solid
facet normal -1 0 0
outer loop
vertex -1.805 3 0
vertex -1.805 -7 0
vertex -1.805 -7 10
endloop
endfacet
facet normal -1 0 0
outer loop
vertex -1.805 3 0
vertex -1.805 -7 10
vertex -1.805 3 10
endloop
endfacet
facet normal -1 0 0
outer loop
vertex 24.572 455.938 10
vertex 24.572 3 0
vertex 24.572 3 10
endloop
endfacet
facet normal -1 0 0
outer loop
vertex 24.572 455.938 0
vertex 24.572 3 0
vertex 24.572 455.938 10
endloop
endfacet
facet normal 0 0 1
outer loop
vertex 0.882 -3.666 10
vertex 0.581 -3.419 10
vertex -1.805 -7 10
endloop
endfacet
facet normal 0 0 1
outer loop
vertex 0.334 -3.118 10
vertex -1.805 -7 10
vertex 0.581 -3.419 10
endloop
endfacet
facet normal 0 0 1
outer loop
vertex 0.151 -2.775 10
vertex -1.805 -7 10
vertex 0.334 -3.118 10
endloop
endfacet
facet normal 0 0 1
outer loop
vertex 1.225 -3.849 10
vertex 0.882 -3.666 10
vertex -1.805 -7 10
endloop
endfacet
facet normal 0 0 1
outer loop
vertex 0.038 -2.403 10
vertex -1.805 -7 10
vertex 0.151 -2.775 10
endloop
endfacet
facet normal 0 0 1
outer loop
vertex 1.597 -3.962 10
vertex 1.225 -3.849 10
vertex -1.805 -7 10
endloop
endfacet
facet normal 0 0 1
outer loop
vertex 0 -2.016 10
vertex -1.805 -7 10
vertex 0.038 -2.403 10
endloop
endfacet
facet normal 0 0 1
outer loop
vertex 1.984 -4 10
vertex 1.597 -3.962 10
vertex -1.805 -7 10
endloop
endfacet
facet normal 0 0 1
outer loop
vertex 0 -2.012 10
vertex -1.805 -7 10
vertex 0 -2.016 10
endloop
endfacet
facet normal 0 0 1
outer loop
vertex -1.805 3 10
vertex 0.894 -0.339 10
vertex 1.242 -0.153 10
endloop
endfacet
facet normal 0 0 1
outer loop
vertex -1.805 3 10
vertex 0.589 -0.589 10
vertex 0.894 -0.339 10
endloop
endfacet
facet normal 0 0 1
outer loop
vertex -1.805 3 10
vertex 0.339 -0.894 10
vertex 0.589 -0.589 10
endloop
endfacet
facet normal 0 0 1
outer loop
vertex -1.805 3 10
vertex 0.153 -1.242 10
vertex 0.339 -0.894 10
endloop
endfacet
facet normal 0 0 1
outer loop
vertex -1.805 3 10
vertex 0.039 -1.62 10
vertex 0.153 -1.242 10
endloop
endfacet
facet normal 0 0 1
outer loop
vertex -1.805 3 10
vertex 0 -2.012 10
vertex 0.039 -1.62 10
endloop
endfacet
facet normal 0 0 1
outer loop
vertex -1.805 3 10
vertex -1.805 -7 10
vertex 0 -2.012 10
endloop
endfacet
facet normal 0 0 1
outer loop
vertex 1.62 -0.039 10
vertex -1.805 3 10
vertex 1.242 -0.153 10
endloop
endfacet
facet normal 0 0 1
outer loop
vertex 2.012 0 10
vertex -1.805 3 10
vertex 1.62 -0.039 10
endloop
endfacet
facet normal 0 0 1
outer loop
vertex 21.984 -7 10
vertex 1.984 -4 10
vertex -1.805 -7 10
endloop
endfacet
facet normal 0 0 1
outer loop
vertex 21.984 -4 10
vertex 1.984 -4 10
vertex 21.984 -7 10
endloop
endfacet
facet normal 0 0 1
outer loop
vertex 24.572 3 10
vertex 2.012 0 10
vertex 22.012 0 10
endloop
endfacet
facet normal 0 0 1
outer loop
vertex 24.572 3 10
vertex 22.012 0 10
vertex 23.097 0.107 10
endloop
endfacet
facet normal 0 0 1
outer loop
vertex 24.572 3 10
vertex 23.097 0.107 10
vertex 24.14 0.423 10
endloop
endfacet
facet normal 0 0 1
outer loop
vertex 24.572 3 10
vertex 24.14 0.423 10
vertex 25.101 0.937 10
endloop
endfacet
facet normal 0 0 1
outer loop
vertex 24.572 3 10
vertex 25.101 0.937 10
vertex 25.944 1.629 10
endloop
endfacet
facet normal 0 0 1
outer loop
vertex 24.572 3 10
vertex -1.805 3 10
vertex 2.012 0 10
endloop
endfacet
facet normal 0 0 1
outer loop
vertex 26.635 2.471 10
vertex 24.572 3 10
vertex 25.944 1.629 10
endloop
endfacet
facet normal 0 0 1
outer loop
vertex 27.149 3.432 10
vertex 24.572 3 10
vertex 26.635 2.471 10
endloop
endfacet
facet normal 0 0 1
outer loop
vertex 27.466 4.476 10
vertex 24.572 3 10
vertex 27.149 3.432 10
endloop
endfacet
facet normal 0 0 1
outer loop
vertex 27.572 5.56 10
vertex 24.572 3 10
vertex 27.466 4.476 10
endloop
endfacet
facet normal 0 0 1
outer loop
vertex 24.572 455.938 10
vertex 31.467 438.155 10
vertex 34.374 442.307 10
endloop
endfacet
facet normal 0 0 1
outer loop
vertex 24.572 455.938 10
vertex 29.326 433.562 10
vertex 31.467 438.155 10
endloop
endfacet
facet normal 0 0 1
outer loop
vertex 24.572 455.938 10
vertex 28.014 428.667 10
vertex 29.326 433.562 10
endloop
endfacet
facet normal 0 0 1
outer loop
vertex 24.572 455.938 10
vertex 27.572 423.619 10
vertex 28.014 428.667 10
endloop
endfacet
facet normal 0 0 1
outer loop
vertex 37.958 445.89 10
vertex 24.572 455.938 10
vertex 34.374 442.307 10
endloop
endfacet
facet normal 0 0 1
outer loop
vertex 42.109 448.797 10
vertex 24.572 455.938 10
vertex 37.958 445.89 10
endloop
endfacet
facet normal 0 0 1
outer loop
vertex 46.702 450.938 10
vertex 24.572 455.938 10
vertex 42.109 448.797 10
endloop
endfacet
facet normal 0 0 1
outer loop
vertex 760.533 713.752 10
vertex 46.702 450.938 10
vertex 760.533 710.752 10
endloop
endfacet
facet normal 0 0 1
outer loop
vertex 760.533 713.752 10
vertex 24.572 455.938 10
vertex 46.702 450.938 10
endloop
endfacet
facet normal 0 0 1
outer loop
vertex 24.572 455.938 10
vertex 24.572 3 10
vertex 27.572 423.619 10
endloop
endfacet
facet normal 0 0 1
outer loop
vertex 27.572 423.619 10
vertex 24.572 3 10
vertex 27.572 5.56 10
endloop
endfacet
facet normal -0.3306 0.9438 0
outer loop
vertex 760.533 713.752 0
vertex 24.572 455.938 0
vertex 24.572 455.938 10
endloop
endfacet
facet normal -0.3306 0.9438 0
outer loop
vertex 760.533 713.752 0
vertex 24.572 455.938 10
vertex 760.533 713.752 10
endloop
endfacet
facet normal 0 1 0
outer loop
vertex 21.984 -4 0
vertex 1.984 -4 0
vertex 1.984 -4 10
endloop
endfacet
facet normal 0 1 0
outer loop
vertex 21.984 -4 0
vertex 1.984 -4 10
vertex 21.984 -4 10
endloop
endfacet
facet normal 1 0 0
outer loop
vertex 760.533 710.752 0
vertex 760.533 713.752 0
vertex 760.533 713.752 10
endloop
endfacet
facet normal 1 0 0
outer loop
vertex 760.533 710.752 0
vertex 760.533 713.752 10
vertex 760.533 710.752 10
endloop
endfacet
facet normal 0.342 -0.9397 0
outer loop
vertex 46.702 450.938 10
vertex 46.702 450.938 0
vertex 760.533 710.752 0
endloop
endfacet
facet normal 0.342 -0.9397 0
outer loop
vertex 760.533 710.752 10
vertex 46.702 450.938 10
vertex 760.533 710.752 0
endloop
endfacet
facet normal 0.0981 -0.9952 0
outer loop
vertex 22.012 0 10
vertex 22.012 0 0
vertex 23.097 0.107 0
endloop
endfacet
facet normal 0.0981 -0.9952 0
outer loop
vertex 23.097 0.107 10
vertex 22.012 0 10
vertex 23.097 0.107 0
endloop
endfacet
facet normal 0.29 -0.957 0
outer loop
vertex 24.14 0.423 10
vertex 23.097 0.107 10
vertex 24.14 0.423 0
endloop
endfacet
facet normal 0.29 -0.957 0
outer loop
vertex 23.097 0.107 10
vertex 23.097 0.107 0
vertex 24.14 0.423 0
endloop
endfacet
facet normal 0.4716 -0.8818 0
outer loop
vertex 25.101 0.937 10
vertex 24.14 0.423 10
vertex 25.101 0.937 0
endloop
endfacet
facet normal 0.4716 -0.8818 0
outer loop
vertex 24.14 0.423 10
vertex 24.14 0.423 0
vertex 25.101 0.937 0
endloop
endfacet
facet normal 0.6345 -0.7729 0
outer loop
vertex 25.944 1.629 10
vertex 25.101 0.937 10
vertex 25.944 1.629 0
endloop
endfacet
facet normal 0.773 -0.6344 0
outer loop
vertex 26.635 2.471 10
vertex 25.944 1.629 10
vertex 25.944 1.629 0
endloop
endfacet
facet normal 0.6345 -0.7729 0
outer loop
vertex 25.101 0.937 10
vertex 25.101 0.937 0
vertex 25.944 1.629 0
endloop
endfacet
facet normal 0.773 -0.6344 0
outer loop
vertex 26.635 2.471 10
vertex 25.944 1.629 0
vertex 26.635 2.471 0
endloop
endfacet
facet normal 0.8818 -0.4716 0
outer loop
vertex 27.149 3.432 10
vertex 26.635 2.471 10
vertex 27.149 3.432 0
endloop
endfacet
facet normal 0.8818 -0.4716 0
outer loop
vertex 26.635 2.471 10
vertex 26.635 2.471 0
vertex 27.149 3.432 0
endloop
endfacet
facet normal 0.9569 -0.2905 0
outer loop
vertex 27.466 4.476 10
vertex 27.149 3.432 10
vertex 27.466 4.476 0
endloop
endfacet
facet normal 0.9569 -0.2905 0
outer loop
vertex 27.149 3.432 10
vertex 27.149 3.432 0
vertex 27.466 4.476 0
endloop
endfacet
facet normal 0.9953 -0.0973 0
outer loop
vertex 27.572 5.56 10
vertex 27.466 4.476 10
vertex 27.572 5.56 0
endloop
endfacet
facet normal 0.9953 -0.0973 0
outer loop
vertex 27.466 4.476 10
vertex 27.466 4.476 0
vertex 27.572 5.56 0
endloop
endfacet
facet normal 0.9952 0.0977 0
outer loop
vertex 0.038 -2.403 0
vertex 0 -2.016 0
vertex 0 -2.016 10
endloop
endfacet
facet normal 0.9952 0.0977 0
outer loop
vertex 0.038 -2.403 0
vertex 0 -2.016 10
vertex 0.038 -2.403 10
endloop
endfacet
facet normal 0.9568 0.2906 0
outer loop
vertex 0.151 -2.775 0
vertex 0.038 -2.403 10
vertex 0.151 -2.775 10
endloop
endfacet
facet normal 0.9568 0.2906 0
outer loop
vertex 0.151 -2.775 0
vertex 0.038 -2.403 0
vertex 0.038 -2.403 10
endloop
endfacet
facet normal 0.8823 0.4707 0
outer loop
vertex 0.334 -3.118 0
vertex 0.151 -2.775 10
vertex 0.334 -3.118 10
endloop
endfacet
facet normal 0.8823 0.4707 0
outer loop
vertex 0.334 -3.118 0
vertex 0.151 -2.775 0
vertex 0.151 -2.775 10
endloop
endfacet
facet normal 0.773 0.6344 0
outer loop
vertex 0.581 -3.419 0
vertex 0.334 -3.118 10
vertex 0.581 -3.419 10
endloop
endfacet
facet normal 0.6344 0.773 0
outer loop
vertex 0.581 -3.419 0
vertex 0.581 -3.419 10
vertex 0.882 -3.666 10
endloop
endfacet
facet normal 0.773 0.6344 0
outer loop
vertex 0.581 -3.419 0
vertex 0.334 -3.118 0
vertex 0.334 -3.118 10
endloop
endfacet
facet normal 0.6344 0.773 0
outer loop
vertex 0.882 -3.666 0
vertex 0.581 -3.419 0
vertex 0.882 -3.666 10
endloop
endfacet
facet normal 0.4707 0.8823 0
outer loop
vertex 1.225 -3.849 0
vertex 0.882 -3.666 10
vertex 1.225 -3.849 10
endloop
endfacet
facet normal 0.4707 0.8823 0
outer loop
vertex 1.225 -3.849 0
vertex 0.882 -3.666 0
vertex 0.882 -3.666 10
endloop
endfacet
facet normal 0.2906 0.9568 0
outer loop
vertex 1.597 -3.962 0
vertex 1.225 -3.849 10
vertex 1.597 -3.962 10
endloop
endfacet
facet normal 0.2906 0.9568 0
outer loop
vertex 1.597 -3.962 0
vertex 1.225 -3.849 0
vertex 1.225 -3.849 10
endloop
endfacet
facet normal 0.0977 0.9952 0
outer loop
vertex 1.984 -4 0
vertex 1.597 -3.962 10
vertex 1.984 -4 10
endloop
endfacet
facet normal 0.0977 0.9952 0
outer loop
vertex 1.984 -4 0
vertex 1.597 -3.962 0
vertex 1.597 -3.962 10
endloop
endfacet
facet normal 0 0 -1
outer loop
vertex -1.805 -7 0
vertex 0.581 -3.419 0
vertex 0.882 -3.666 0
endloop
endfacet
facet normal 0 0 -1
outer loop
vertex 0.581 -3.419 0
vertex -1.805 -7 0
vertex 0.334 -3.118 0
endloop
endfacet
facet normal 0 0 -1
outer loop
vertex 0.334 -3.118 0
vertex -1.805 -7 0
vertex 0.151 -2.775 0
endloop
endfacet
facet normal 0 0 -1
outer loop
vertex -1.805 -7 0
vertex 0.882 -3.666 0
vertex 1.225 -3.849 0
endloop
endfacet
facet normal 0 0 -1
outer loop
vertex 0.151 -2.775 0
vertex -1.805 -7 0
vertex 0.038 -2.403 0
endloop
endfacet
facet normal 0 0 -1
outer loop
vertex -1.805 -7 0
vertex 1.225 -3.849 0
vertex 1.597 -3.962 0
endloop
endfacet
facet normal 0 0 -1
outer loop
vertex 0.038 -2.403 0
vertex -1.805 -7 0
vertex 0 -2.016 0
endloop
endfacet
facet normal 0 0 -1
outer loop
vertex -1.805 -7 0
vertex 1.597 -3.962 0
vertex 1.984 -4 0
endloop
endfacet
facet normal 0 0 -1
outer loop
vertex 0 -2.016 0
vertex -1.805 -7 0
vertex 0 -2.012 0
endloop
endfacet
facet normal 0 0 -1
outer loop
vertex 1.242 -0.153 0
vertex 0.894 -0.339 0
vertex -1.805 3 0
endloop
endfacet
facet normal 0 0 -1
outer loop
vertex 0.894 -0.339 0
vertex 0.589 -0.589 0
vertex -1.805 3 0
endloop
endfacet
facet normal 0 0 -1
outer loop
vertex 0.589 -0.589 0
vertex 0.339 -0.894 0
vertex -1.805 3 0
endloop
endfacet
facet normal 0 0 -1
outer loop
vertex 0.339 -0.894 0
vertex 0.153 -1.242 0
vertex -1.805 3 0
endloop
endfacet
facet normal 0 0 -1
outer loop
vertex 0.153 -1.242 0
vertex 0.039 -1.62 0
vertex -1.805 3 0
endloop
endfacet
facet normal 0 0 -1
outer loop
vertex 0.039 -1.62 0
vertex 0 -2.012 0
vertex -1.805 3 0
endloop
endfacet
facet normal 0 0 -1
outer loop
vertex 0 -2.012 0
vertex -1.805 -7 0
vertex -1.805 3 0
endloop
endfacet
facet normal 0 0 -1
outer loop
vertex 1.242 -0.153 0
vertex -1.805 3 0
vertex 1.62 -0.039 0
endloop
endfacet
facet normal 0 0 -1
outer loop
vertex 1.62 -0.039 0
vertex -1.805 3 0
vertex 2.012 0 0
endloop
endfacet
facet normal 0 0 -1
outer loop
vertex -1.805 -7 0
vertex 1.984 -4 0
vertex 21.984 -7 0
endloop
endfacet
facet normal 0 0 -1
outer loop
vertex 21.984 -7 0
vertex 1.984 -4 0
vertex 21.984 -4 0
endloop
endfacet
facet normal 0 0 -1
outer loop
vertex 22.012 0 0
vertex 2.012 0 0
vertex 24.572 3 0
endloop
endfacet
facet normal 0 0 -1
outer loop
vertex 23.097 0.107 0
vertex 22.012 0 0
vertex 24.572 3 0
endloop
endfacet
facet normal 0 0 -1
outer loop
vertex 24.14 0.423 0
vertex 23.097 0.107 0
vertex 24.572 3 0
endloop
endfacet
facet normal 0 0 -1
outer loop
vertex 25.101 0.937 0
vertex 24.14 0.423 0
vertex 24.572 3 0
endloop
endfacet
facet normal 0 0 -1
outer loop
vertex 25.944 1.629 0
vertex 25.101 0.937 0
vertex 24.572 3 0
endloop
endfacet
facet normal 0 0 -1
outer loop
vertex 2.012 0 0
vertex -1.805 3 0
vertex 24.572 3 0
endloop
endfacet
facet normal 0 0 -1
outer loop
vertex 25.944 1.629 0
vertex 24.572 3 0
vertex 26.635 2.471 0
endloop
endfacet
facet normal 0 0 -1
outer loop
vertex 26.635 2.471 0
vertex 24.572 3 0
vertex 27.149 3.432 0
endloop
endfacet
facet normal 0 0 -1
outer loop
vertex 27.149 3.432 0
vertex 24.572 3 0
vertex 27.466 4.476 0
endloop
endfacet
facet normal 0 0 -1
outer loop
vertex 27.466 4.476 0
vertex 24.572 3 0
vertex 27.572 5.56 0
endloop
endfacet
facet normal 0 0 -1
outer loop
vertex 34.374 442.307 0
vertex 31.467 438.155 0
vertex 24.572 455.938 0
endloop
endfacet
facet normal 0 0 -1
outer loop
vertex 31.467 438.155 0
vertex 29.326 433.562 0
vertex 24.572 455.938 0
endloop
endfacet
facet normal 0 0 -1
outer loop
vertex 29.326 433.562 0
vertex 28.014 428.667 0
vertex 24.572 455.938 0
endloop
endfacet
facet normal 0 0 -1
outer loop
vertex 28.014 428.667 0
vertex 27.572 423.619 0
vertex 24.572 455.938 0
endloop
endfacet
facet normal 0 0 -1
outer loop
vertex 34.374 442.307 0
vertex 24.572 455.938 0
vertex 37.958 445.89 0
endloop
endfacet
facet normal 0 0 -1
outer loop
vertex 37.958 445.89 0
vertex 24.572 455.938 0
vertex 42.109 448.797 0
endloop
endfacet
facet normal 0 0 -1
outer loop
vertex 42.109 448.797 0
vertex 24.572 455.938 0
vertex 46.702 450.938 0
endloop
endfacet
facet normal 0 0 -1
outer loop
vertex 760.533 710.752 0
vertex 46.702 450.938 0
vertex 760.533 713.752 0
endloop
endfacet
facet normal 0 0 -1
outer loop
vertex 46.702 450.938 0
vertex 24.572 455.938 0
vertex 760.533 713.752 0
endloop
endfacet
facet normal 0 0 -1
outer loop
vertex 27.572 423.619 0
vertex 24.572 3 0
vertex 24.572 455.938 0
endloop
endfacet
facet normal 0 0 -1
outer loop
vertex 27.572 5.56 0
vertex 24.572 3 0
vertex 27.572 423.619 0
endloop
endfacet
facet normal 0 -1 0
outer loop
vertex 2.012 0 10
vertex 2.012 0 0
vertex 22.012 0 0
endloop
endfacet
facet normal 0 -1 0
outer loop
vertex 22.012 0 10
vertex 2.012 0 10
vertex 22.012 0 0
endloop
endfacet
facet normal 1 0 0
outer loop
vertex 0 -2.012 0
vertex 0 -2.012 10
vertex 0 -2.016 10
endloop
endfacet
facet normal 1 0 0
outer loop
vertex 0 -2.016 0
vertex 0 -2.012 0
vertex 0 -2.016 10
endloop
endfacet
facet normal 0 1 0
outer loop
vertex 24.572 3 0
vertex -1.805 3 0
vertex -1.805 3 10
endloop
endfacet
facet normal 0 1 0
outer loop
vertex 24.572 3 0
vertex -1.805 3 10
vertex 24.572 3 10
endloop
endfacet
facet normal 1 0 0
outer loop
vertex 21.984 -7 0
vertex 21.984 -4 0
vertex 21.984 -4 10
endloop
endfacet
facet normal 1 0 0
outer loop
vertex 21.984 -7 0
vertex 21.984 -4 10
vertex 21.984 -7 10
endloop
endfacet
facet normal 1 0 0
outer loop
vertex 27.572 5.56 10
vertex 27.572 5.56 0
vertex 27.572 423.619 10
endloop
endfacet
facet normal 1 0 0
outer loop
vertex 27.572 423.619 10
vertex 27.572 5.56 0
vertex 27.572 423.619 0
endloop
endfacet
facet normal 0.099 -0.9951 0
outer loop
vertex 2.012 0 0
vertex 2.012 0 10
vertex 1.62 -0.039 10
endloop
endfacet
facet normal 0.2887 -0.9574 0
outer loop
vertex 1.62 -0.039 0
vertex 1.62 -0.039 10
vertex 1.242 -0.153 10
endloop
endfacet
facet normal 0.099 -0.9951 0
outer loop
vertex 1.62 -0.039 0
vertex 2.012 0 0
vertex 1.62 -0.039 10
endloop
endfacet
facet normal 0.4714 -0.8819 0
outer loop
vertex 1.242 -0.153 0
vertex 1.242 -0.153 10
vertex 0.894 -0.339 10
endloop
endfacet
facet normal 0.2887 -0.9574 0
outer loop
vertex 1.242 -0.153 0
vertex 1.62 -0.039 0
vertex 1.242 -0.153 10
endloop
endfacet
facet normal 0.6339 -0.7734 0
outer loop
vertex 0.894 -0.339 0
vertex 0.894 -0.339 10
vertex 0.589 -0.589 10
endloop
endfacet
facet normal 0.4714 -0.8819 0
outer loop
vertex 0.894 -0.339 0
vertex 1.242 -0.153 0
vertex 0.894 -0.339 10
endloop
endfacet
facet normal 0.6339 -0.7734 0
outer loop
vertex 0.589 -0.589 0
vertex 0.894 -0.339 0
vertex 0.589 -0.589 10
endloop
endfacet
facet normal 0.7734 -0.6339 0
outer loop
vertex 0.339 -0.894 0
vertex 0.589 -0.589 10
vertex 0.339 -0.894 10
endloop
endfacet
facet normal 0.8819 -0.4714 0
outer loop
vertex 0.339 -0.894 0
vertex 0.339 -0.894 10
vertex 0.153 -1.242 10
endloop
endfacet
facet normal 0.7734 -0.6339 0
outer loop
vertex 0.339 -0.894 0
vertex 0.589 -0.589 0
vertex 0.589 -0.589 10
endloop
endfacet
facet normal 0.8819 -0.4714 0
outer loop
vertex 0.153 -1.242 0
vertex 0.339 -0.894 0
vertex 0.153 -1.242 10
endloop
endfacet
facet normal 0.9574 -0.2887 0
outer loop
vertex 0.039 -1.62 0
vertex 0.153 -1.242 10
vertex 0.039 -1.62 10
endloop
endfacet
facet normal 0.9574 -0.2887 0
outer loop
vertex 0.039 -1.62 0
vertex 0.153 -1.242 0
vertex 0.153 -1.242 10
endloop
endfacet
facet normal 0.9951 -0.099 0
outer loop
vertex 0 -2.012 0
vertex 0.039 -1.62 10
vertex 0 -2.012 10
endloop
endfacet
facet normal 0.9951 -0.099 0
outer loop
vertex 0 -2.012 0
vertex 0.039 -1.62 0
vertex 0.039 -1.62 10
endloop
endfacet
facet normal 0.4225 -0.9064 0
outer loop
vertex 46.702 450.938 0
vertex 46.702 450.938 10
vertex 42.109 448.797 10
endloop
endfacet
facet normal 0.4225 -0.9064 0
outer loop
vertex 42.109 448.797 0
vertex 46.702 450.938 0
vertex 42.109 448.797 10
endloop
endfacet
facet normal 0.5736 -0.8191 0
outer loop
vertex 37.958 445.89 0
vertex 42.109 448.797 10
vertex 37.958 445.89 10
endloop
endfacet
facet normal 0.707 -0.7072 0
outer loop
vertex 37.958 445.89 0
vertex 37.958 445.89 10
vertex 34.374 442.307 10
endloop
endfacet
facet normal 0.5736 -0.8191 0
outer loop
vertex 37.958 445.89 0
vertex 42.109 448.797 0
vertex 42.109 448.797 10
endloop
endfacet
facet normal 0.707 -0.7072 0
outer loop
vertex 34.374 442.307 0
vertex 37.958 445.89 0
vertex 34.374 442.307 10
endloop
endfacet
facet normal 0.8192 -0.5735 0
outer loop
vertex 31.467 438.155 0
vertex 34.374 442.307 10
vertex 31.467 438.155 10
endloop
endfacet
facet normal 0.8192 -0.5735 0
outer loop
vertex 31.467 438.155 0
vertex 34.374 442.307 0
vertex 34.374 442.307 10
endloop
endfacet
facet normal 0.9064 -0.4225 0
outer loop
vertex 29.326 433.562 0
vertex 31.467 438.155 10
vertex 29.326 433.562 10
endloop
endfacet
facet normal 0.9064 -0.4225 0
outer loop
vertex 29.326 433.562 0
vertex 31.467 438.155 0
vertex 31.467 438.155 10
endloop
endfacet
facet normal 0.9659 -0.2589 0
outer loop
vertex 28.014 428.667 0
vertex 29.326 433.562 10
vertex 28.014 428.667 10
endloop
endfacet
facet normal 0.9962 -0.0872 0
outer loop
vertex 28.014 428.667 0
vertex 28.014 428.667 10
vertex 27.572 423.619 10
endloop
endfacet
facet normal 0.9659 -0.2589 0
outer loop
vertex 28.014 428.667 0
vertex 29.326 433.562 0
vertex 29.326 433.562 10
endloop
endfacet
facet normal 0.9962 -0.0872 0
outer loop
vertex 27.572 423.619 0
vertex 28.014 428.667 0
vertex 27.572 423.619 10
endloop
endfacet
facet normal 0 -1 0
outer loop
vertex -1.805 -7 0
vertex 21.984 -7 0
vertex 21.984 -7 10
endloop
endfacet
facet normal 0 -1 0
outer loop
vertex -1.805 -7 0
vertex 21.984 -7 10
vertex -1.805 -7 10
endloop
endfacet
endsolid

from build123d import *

# Parameters (mm, degrees)
PAD_DEPTH = 10


with BuildPart() as part:
    # Sketch → Pad (new body)
    with BuildSketch(Plane.XY):
        with BuildLine():
            Line((2.012226, 0), (22.012226, 0))
            ThreePointArc((22.012226, 0), (25.943926, 1.628563), (27.572489, 5.560263))
            Line((27.572489, 5.560263), (27.572489, 423.618953))
            ThreePointArc((46.701722, 450.938329), (32.830223, 440.294353), (27.572489, 423.618953))
            Line((46.701722, 450.938329), (760.532733, 710.751569))
            Line((760.532733, 713.751569), (760.532733, 710.751569))
            Line((24.572489, 455.938329), (760.532733, 713.751569))
            Line((24.572489, 3), (24.572489, 455.938329))
            Line((-1.804961, 3), (24.572489, 3))
            Line((-1.804961, -7), (-1.804961, 3))
            Line((21.983993, -7), (-1.804961, -7))
            Line((21.983993, -4), (21.983993, -7))
            Line((1.983993, -4), (21.983993, -4))
            ThreePointArc((0, -2.016007), (0.581098, -3.418902), (1.983993, -4))
            Line((0, -2.012226), (0, -2.016007))
            ThreePointArc((2.012226, 0), (0.589367, -0.589367), (0, -2.012226))
        make_face()
    extrude(amount=PAD_DEPTH)


solid = part.part
